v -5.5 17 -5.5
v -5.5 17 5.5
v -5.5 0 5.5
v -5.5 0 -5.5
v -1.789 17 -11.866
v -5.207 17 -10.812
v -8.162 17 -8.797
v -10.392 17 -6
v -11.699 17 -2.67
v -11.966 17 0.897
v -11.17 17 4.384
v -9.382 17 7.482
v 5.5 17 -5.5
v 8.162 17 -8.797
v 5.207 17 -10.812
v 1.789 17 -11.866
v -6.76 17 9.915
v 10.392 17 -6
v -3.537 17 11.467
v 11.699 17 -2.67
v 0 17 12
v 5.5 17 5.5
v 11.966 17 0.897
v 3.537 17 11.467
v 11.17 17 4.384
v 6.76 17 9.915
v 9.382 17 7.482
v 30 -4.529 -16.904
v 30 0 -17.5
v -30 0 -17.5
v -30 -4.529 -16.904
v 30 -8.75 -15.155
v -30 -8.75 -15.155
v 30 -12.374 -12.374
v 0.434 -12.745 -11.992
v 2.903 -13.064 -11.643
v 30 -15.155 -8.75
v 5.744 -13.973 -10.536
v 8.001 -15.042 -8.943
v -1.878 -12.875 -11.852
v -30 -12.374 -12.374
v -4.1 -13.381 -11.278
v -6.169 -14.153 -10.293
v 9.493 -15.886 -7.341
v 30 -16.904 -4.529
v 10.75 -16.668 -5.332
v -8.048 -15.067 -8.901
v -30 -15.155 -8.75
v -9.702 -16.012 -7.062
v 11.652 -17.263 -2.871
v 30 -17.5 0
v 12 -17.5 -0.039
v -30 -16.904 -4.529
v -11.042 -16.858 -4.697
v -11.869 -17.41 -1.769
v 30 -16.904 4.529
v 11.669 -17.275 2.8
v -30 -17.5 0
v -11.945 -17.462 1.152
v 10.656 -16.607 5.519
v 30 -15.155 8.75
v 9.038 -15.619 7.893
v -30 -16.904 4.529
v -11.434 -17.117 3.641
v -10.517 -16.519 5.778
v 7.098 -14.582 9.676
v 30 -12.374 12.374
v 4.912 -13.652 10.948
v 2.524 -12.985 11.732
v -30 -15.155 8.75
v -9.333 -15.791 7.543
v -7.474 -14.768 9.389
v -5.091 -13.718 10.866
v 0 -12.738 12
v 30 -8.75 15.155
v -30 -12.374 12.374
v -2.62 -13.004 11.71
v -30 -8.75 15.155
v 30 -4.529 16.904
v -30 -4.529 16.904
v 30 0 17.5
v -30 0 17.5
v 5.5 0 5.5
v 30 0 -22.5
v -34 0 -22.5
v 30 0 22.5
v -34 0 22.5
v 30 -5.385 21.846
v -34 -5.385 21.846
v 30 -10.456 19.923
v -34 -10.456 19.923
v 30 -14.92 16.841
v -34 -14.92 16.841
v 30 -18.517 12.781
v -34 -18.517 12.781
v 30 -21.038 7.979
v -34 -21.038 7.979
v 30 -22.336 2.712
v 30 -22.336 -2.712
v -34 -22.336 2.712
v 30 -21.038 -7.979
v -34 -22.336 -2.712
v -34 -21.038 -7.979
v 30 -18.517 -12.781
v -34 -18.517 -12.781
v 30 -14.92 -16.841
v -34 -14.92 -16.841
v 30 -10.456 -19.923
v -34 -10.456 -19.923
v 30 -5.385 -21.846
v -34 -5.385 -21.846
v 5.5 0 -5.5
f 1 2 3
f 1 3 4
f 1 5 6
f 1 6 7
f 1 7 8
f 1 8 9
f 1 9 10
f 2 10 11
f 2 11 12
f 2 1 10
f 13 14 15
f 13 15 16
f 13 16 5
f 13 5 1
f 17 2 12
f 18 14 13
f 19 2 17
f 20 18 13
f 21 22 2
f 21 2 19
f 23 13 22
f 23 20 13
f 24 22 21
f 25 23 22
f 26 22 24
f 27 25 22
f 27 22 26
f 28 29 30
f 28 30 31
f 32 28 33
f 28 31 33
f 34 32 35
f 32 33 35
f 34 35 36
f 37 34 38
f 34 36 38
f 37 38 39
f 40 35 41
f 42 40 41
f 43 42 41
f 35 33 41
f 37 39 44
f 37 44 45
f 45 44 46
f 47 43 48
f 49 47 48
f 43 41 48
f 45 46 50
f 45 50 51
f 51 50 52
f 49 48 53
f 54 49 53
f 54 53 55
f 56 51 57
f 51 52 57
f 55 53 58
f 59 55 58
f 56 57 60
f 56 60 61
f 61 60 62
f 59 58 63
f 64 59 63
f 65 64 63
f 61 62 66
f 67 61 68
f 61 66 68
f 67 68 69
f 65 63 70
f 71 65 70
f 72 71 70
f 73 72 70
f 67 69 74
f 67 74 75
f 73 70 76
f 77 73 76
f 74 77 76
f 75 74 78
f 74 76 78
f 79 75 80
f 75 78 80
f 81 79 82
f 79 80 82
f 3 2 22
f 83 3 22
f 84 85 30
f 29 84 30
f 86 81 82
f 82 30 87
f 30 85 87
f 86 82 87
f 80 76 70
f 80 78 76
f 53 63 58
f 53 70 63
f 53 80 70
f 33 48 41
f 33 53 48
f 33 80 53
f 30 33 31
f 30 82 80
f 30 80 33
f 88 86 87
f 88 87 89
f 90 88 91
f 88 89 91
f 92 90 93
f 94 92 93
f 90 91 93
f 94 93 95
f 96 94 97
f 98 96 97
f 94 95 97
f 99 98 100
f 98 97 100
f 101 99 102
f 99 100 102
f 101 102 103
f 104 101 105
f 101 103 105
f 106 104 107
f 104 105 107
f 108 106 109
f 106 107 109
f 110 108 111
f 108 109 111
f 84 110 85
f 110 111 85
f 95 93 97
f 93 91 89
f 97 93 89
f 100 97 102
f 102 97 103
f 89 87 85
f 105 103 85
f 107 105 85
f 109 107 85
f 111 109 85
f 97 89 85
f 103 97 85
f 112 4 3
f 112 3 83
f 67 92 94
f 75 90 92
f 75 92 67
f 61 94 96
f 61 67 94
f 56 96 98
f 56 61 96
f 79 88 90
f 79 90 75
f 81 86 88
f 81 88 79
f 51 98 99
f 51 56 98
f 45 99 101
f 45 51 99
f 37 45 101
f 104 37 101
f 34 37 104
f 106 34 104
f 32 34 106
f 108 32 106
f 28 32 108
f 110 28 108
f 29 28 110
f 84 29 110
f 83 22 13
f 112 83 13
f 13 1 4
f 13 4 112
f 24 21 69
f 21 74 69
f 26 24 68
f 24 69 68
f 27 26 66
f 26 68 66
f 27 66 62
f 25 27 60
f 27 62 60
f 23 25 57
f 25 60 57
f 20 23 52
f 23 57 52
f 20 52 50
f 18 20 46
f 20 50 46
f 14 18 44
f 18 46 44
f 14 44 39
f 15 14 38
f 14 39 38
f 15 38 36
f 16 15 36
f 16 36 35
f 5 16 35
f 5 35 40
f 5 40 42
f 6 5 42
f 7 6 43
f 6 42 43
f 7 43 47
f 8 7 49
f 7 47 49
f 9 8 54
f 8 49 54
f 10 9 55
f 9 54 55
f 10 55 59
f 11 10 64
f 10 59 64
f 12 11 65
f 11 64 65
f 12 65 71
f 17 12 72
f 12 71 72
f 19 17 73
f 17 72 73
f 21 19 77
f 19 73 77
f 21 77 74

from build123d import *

# Parameters (mm, degrees)
BOSS_EXTRUDE1_DEPTH             = 30
BOSS_EXTRUDE1_DEPTH_BACK        = 30
BOSS_EXTRUDE2_REACH             = 45.732
BOSS_EXTRUDE2_END_RADIUS        = 17.5
SKETCH3_R                       = 12
BOSS_EXTRUDE2_DIRECTION_2_DEPTH = 17
BOSS_EXTRUDE3_START             = 4
BOSS_EXTRUDE3_DEPTH             = 4
SKETCH5_W                       = 11
SKETCH5_H                       = 11
CUT_EXTRUDE1_DEPTH              = 17


with BuildPart() as part:
    # Sketch1 → Boss-Extrude1 (new, two sides: drawn at the far end of the back side and taken through both)
    with BuildSketch(Plane(origin=(0, 0, 0), x_dir=(0, 0, -1), z_dir=(1, 0, 0)).offset(-BOSS_EXTRUDE1_DEPTH_BACK)):
        with BuildLine():
            Line((-17.5, 0), (-22.5, 0))
            ThreePointArc((-22.5, 0), (0, -22.5), (22.5, 0))
            Line((22.5, 0), (17.5, 0))
            ThreePointArc((17.5, 0), (0, -17.5), (-17.5, 0))
        make_face()
    extrude(amount=BOSS_EXTRUDE1_DEPTH + BOSS_EXTRUDE1_DEPTH_BACK)

    # Boss-Extrude2: up to this cylinder (the profile starts inside it)
    boss_extrude2_end = Plane(origin=(0, 0, 0), z_dir=(1, 0, 0)) * Cylinder(BOSS_EXTRUDE2_END_RADIUS, 127.464, mode=Mode.PRIVATE)
    # Sketch3 → Boss-Extrude2 (add, up to the surface)
    with BuildSketch(Plane(origin=(0, 0, 0), x_dir=(1, 0, 0), z_dir=(0, 1, 0)), mode=Mode.PRIVATE) as boss_extrude2_sk1:
        Circle(SKETCH3_R)
    boss_extrude2_tool1 = extrude(boss_extrude2_sk1.sketch, amount=-BOSS_EXTRUDE2_REACH, mode=Mode.PRIVATE) & boss_extrude2_end
    add(boss_extrude2_tool1.solids().sort_by_distance((0, 0, 0))[0])

    # Sketch3 → Boss-Extrude2 direction 2 (add)
    with BuildSketch(Plane(origin=(0, 0, 0), x_dir=(1, 0, 0), z_dir=(0, 1, 0))):
        Circle(SKETCH3_R)
    extrude(amount=BOSS_EXTRUDE2_DIRECTION_2_DEPTH)

    # Sketch4 → Boss-Extrude3 (add)
    with BuildSketch(Plane.ZY.offset(30).offset(BOSS_EXTRUDE3_START)):
        with BuildLine():
            Line((-22.5, 0), (22.5, 0))
            ThreePointArc((22.5, 0), (0, -22.5), (-22.5, 0))
        make_face()
    extrude(amount=-BOSS_EXTRUDE3_DEPTH)

    # Sketch5 → Cut-Extrude1 (cut)
    with BuildSketch(Plane(origin=(0, 17, 0), x_dir=(1, 0, 0), z_dir=(0, 1, 0))):
        Rectangle(SKETCH5_W, SKETCH5_H)
    extrude(amount=-CUT_EXTRUDE1_DEPTH, mode=Mode.SUBTRACT)


solid = part.part
